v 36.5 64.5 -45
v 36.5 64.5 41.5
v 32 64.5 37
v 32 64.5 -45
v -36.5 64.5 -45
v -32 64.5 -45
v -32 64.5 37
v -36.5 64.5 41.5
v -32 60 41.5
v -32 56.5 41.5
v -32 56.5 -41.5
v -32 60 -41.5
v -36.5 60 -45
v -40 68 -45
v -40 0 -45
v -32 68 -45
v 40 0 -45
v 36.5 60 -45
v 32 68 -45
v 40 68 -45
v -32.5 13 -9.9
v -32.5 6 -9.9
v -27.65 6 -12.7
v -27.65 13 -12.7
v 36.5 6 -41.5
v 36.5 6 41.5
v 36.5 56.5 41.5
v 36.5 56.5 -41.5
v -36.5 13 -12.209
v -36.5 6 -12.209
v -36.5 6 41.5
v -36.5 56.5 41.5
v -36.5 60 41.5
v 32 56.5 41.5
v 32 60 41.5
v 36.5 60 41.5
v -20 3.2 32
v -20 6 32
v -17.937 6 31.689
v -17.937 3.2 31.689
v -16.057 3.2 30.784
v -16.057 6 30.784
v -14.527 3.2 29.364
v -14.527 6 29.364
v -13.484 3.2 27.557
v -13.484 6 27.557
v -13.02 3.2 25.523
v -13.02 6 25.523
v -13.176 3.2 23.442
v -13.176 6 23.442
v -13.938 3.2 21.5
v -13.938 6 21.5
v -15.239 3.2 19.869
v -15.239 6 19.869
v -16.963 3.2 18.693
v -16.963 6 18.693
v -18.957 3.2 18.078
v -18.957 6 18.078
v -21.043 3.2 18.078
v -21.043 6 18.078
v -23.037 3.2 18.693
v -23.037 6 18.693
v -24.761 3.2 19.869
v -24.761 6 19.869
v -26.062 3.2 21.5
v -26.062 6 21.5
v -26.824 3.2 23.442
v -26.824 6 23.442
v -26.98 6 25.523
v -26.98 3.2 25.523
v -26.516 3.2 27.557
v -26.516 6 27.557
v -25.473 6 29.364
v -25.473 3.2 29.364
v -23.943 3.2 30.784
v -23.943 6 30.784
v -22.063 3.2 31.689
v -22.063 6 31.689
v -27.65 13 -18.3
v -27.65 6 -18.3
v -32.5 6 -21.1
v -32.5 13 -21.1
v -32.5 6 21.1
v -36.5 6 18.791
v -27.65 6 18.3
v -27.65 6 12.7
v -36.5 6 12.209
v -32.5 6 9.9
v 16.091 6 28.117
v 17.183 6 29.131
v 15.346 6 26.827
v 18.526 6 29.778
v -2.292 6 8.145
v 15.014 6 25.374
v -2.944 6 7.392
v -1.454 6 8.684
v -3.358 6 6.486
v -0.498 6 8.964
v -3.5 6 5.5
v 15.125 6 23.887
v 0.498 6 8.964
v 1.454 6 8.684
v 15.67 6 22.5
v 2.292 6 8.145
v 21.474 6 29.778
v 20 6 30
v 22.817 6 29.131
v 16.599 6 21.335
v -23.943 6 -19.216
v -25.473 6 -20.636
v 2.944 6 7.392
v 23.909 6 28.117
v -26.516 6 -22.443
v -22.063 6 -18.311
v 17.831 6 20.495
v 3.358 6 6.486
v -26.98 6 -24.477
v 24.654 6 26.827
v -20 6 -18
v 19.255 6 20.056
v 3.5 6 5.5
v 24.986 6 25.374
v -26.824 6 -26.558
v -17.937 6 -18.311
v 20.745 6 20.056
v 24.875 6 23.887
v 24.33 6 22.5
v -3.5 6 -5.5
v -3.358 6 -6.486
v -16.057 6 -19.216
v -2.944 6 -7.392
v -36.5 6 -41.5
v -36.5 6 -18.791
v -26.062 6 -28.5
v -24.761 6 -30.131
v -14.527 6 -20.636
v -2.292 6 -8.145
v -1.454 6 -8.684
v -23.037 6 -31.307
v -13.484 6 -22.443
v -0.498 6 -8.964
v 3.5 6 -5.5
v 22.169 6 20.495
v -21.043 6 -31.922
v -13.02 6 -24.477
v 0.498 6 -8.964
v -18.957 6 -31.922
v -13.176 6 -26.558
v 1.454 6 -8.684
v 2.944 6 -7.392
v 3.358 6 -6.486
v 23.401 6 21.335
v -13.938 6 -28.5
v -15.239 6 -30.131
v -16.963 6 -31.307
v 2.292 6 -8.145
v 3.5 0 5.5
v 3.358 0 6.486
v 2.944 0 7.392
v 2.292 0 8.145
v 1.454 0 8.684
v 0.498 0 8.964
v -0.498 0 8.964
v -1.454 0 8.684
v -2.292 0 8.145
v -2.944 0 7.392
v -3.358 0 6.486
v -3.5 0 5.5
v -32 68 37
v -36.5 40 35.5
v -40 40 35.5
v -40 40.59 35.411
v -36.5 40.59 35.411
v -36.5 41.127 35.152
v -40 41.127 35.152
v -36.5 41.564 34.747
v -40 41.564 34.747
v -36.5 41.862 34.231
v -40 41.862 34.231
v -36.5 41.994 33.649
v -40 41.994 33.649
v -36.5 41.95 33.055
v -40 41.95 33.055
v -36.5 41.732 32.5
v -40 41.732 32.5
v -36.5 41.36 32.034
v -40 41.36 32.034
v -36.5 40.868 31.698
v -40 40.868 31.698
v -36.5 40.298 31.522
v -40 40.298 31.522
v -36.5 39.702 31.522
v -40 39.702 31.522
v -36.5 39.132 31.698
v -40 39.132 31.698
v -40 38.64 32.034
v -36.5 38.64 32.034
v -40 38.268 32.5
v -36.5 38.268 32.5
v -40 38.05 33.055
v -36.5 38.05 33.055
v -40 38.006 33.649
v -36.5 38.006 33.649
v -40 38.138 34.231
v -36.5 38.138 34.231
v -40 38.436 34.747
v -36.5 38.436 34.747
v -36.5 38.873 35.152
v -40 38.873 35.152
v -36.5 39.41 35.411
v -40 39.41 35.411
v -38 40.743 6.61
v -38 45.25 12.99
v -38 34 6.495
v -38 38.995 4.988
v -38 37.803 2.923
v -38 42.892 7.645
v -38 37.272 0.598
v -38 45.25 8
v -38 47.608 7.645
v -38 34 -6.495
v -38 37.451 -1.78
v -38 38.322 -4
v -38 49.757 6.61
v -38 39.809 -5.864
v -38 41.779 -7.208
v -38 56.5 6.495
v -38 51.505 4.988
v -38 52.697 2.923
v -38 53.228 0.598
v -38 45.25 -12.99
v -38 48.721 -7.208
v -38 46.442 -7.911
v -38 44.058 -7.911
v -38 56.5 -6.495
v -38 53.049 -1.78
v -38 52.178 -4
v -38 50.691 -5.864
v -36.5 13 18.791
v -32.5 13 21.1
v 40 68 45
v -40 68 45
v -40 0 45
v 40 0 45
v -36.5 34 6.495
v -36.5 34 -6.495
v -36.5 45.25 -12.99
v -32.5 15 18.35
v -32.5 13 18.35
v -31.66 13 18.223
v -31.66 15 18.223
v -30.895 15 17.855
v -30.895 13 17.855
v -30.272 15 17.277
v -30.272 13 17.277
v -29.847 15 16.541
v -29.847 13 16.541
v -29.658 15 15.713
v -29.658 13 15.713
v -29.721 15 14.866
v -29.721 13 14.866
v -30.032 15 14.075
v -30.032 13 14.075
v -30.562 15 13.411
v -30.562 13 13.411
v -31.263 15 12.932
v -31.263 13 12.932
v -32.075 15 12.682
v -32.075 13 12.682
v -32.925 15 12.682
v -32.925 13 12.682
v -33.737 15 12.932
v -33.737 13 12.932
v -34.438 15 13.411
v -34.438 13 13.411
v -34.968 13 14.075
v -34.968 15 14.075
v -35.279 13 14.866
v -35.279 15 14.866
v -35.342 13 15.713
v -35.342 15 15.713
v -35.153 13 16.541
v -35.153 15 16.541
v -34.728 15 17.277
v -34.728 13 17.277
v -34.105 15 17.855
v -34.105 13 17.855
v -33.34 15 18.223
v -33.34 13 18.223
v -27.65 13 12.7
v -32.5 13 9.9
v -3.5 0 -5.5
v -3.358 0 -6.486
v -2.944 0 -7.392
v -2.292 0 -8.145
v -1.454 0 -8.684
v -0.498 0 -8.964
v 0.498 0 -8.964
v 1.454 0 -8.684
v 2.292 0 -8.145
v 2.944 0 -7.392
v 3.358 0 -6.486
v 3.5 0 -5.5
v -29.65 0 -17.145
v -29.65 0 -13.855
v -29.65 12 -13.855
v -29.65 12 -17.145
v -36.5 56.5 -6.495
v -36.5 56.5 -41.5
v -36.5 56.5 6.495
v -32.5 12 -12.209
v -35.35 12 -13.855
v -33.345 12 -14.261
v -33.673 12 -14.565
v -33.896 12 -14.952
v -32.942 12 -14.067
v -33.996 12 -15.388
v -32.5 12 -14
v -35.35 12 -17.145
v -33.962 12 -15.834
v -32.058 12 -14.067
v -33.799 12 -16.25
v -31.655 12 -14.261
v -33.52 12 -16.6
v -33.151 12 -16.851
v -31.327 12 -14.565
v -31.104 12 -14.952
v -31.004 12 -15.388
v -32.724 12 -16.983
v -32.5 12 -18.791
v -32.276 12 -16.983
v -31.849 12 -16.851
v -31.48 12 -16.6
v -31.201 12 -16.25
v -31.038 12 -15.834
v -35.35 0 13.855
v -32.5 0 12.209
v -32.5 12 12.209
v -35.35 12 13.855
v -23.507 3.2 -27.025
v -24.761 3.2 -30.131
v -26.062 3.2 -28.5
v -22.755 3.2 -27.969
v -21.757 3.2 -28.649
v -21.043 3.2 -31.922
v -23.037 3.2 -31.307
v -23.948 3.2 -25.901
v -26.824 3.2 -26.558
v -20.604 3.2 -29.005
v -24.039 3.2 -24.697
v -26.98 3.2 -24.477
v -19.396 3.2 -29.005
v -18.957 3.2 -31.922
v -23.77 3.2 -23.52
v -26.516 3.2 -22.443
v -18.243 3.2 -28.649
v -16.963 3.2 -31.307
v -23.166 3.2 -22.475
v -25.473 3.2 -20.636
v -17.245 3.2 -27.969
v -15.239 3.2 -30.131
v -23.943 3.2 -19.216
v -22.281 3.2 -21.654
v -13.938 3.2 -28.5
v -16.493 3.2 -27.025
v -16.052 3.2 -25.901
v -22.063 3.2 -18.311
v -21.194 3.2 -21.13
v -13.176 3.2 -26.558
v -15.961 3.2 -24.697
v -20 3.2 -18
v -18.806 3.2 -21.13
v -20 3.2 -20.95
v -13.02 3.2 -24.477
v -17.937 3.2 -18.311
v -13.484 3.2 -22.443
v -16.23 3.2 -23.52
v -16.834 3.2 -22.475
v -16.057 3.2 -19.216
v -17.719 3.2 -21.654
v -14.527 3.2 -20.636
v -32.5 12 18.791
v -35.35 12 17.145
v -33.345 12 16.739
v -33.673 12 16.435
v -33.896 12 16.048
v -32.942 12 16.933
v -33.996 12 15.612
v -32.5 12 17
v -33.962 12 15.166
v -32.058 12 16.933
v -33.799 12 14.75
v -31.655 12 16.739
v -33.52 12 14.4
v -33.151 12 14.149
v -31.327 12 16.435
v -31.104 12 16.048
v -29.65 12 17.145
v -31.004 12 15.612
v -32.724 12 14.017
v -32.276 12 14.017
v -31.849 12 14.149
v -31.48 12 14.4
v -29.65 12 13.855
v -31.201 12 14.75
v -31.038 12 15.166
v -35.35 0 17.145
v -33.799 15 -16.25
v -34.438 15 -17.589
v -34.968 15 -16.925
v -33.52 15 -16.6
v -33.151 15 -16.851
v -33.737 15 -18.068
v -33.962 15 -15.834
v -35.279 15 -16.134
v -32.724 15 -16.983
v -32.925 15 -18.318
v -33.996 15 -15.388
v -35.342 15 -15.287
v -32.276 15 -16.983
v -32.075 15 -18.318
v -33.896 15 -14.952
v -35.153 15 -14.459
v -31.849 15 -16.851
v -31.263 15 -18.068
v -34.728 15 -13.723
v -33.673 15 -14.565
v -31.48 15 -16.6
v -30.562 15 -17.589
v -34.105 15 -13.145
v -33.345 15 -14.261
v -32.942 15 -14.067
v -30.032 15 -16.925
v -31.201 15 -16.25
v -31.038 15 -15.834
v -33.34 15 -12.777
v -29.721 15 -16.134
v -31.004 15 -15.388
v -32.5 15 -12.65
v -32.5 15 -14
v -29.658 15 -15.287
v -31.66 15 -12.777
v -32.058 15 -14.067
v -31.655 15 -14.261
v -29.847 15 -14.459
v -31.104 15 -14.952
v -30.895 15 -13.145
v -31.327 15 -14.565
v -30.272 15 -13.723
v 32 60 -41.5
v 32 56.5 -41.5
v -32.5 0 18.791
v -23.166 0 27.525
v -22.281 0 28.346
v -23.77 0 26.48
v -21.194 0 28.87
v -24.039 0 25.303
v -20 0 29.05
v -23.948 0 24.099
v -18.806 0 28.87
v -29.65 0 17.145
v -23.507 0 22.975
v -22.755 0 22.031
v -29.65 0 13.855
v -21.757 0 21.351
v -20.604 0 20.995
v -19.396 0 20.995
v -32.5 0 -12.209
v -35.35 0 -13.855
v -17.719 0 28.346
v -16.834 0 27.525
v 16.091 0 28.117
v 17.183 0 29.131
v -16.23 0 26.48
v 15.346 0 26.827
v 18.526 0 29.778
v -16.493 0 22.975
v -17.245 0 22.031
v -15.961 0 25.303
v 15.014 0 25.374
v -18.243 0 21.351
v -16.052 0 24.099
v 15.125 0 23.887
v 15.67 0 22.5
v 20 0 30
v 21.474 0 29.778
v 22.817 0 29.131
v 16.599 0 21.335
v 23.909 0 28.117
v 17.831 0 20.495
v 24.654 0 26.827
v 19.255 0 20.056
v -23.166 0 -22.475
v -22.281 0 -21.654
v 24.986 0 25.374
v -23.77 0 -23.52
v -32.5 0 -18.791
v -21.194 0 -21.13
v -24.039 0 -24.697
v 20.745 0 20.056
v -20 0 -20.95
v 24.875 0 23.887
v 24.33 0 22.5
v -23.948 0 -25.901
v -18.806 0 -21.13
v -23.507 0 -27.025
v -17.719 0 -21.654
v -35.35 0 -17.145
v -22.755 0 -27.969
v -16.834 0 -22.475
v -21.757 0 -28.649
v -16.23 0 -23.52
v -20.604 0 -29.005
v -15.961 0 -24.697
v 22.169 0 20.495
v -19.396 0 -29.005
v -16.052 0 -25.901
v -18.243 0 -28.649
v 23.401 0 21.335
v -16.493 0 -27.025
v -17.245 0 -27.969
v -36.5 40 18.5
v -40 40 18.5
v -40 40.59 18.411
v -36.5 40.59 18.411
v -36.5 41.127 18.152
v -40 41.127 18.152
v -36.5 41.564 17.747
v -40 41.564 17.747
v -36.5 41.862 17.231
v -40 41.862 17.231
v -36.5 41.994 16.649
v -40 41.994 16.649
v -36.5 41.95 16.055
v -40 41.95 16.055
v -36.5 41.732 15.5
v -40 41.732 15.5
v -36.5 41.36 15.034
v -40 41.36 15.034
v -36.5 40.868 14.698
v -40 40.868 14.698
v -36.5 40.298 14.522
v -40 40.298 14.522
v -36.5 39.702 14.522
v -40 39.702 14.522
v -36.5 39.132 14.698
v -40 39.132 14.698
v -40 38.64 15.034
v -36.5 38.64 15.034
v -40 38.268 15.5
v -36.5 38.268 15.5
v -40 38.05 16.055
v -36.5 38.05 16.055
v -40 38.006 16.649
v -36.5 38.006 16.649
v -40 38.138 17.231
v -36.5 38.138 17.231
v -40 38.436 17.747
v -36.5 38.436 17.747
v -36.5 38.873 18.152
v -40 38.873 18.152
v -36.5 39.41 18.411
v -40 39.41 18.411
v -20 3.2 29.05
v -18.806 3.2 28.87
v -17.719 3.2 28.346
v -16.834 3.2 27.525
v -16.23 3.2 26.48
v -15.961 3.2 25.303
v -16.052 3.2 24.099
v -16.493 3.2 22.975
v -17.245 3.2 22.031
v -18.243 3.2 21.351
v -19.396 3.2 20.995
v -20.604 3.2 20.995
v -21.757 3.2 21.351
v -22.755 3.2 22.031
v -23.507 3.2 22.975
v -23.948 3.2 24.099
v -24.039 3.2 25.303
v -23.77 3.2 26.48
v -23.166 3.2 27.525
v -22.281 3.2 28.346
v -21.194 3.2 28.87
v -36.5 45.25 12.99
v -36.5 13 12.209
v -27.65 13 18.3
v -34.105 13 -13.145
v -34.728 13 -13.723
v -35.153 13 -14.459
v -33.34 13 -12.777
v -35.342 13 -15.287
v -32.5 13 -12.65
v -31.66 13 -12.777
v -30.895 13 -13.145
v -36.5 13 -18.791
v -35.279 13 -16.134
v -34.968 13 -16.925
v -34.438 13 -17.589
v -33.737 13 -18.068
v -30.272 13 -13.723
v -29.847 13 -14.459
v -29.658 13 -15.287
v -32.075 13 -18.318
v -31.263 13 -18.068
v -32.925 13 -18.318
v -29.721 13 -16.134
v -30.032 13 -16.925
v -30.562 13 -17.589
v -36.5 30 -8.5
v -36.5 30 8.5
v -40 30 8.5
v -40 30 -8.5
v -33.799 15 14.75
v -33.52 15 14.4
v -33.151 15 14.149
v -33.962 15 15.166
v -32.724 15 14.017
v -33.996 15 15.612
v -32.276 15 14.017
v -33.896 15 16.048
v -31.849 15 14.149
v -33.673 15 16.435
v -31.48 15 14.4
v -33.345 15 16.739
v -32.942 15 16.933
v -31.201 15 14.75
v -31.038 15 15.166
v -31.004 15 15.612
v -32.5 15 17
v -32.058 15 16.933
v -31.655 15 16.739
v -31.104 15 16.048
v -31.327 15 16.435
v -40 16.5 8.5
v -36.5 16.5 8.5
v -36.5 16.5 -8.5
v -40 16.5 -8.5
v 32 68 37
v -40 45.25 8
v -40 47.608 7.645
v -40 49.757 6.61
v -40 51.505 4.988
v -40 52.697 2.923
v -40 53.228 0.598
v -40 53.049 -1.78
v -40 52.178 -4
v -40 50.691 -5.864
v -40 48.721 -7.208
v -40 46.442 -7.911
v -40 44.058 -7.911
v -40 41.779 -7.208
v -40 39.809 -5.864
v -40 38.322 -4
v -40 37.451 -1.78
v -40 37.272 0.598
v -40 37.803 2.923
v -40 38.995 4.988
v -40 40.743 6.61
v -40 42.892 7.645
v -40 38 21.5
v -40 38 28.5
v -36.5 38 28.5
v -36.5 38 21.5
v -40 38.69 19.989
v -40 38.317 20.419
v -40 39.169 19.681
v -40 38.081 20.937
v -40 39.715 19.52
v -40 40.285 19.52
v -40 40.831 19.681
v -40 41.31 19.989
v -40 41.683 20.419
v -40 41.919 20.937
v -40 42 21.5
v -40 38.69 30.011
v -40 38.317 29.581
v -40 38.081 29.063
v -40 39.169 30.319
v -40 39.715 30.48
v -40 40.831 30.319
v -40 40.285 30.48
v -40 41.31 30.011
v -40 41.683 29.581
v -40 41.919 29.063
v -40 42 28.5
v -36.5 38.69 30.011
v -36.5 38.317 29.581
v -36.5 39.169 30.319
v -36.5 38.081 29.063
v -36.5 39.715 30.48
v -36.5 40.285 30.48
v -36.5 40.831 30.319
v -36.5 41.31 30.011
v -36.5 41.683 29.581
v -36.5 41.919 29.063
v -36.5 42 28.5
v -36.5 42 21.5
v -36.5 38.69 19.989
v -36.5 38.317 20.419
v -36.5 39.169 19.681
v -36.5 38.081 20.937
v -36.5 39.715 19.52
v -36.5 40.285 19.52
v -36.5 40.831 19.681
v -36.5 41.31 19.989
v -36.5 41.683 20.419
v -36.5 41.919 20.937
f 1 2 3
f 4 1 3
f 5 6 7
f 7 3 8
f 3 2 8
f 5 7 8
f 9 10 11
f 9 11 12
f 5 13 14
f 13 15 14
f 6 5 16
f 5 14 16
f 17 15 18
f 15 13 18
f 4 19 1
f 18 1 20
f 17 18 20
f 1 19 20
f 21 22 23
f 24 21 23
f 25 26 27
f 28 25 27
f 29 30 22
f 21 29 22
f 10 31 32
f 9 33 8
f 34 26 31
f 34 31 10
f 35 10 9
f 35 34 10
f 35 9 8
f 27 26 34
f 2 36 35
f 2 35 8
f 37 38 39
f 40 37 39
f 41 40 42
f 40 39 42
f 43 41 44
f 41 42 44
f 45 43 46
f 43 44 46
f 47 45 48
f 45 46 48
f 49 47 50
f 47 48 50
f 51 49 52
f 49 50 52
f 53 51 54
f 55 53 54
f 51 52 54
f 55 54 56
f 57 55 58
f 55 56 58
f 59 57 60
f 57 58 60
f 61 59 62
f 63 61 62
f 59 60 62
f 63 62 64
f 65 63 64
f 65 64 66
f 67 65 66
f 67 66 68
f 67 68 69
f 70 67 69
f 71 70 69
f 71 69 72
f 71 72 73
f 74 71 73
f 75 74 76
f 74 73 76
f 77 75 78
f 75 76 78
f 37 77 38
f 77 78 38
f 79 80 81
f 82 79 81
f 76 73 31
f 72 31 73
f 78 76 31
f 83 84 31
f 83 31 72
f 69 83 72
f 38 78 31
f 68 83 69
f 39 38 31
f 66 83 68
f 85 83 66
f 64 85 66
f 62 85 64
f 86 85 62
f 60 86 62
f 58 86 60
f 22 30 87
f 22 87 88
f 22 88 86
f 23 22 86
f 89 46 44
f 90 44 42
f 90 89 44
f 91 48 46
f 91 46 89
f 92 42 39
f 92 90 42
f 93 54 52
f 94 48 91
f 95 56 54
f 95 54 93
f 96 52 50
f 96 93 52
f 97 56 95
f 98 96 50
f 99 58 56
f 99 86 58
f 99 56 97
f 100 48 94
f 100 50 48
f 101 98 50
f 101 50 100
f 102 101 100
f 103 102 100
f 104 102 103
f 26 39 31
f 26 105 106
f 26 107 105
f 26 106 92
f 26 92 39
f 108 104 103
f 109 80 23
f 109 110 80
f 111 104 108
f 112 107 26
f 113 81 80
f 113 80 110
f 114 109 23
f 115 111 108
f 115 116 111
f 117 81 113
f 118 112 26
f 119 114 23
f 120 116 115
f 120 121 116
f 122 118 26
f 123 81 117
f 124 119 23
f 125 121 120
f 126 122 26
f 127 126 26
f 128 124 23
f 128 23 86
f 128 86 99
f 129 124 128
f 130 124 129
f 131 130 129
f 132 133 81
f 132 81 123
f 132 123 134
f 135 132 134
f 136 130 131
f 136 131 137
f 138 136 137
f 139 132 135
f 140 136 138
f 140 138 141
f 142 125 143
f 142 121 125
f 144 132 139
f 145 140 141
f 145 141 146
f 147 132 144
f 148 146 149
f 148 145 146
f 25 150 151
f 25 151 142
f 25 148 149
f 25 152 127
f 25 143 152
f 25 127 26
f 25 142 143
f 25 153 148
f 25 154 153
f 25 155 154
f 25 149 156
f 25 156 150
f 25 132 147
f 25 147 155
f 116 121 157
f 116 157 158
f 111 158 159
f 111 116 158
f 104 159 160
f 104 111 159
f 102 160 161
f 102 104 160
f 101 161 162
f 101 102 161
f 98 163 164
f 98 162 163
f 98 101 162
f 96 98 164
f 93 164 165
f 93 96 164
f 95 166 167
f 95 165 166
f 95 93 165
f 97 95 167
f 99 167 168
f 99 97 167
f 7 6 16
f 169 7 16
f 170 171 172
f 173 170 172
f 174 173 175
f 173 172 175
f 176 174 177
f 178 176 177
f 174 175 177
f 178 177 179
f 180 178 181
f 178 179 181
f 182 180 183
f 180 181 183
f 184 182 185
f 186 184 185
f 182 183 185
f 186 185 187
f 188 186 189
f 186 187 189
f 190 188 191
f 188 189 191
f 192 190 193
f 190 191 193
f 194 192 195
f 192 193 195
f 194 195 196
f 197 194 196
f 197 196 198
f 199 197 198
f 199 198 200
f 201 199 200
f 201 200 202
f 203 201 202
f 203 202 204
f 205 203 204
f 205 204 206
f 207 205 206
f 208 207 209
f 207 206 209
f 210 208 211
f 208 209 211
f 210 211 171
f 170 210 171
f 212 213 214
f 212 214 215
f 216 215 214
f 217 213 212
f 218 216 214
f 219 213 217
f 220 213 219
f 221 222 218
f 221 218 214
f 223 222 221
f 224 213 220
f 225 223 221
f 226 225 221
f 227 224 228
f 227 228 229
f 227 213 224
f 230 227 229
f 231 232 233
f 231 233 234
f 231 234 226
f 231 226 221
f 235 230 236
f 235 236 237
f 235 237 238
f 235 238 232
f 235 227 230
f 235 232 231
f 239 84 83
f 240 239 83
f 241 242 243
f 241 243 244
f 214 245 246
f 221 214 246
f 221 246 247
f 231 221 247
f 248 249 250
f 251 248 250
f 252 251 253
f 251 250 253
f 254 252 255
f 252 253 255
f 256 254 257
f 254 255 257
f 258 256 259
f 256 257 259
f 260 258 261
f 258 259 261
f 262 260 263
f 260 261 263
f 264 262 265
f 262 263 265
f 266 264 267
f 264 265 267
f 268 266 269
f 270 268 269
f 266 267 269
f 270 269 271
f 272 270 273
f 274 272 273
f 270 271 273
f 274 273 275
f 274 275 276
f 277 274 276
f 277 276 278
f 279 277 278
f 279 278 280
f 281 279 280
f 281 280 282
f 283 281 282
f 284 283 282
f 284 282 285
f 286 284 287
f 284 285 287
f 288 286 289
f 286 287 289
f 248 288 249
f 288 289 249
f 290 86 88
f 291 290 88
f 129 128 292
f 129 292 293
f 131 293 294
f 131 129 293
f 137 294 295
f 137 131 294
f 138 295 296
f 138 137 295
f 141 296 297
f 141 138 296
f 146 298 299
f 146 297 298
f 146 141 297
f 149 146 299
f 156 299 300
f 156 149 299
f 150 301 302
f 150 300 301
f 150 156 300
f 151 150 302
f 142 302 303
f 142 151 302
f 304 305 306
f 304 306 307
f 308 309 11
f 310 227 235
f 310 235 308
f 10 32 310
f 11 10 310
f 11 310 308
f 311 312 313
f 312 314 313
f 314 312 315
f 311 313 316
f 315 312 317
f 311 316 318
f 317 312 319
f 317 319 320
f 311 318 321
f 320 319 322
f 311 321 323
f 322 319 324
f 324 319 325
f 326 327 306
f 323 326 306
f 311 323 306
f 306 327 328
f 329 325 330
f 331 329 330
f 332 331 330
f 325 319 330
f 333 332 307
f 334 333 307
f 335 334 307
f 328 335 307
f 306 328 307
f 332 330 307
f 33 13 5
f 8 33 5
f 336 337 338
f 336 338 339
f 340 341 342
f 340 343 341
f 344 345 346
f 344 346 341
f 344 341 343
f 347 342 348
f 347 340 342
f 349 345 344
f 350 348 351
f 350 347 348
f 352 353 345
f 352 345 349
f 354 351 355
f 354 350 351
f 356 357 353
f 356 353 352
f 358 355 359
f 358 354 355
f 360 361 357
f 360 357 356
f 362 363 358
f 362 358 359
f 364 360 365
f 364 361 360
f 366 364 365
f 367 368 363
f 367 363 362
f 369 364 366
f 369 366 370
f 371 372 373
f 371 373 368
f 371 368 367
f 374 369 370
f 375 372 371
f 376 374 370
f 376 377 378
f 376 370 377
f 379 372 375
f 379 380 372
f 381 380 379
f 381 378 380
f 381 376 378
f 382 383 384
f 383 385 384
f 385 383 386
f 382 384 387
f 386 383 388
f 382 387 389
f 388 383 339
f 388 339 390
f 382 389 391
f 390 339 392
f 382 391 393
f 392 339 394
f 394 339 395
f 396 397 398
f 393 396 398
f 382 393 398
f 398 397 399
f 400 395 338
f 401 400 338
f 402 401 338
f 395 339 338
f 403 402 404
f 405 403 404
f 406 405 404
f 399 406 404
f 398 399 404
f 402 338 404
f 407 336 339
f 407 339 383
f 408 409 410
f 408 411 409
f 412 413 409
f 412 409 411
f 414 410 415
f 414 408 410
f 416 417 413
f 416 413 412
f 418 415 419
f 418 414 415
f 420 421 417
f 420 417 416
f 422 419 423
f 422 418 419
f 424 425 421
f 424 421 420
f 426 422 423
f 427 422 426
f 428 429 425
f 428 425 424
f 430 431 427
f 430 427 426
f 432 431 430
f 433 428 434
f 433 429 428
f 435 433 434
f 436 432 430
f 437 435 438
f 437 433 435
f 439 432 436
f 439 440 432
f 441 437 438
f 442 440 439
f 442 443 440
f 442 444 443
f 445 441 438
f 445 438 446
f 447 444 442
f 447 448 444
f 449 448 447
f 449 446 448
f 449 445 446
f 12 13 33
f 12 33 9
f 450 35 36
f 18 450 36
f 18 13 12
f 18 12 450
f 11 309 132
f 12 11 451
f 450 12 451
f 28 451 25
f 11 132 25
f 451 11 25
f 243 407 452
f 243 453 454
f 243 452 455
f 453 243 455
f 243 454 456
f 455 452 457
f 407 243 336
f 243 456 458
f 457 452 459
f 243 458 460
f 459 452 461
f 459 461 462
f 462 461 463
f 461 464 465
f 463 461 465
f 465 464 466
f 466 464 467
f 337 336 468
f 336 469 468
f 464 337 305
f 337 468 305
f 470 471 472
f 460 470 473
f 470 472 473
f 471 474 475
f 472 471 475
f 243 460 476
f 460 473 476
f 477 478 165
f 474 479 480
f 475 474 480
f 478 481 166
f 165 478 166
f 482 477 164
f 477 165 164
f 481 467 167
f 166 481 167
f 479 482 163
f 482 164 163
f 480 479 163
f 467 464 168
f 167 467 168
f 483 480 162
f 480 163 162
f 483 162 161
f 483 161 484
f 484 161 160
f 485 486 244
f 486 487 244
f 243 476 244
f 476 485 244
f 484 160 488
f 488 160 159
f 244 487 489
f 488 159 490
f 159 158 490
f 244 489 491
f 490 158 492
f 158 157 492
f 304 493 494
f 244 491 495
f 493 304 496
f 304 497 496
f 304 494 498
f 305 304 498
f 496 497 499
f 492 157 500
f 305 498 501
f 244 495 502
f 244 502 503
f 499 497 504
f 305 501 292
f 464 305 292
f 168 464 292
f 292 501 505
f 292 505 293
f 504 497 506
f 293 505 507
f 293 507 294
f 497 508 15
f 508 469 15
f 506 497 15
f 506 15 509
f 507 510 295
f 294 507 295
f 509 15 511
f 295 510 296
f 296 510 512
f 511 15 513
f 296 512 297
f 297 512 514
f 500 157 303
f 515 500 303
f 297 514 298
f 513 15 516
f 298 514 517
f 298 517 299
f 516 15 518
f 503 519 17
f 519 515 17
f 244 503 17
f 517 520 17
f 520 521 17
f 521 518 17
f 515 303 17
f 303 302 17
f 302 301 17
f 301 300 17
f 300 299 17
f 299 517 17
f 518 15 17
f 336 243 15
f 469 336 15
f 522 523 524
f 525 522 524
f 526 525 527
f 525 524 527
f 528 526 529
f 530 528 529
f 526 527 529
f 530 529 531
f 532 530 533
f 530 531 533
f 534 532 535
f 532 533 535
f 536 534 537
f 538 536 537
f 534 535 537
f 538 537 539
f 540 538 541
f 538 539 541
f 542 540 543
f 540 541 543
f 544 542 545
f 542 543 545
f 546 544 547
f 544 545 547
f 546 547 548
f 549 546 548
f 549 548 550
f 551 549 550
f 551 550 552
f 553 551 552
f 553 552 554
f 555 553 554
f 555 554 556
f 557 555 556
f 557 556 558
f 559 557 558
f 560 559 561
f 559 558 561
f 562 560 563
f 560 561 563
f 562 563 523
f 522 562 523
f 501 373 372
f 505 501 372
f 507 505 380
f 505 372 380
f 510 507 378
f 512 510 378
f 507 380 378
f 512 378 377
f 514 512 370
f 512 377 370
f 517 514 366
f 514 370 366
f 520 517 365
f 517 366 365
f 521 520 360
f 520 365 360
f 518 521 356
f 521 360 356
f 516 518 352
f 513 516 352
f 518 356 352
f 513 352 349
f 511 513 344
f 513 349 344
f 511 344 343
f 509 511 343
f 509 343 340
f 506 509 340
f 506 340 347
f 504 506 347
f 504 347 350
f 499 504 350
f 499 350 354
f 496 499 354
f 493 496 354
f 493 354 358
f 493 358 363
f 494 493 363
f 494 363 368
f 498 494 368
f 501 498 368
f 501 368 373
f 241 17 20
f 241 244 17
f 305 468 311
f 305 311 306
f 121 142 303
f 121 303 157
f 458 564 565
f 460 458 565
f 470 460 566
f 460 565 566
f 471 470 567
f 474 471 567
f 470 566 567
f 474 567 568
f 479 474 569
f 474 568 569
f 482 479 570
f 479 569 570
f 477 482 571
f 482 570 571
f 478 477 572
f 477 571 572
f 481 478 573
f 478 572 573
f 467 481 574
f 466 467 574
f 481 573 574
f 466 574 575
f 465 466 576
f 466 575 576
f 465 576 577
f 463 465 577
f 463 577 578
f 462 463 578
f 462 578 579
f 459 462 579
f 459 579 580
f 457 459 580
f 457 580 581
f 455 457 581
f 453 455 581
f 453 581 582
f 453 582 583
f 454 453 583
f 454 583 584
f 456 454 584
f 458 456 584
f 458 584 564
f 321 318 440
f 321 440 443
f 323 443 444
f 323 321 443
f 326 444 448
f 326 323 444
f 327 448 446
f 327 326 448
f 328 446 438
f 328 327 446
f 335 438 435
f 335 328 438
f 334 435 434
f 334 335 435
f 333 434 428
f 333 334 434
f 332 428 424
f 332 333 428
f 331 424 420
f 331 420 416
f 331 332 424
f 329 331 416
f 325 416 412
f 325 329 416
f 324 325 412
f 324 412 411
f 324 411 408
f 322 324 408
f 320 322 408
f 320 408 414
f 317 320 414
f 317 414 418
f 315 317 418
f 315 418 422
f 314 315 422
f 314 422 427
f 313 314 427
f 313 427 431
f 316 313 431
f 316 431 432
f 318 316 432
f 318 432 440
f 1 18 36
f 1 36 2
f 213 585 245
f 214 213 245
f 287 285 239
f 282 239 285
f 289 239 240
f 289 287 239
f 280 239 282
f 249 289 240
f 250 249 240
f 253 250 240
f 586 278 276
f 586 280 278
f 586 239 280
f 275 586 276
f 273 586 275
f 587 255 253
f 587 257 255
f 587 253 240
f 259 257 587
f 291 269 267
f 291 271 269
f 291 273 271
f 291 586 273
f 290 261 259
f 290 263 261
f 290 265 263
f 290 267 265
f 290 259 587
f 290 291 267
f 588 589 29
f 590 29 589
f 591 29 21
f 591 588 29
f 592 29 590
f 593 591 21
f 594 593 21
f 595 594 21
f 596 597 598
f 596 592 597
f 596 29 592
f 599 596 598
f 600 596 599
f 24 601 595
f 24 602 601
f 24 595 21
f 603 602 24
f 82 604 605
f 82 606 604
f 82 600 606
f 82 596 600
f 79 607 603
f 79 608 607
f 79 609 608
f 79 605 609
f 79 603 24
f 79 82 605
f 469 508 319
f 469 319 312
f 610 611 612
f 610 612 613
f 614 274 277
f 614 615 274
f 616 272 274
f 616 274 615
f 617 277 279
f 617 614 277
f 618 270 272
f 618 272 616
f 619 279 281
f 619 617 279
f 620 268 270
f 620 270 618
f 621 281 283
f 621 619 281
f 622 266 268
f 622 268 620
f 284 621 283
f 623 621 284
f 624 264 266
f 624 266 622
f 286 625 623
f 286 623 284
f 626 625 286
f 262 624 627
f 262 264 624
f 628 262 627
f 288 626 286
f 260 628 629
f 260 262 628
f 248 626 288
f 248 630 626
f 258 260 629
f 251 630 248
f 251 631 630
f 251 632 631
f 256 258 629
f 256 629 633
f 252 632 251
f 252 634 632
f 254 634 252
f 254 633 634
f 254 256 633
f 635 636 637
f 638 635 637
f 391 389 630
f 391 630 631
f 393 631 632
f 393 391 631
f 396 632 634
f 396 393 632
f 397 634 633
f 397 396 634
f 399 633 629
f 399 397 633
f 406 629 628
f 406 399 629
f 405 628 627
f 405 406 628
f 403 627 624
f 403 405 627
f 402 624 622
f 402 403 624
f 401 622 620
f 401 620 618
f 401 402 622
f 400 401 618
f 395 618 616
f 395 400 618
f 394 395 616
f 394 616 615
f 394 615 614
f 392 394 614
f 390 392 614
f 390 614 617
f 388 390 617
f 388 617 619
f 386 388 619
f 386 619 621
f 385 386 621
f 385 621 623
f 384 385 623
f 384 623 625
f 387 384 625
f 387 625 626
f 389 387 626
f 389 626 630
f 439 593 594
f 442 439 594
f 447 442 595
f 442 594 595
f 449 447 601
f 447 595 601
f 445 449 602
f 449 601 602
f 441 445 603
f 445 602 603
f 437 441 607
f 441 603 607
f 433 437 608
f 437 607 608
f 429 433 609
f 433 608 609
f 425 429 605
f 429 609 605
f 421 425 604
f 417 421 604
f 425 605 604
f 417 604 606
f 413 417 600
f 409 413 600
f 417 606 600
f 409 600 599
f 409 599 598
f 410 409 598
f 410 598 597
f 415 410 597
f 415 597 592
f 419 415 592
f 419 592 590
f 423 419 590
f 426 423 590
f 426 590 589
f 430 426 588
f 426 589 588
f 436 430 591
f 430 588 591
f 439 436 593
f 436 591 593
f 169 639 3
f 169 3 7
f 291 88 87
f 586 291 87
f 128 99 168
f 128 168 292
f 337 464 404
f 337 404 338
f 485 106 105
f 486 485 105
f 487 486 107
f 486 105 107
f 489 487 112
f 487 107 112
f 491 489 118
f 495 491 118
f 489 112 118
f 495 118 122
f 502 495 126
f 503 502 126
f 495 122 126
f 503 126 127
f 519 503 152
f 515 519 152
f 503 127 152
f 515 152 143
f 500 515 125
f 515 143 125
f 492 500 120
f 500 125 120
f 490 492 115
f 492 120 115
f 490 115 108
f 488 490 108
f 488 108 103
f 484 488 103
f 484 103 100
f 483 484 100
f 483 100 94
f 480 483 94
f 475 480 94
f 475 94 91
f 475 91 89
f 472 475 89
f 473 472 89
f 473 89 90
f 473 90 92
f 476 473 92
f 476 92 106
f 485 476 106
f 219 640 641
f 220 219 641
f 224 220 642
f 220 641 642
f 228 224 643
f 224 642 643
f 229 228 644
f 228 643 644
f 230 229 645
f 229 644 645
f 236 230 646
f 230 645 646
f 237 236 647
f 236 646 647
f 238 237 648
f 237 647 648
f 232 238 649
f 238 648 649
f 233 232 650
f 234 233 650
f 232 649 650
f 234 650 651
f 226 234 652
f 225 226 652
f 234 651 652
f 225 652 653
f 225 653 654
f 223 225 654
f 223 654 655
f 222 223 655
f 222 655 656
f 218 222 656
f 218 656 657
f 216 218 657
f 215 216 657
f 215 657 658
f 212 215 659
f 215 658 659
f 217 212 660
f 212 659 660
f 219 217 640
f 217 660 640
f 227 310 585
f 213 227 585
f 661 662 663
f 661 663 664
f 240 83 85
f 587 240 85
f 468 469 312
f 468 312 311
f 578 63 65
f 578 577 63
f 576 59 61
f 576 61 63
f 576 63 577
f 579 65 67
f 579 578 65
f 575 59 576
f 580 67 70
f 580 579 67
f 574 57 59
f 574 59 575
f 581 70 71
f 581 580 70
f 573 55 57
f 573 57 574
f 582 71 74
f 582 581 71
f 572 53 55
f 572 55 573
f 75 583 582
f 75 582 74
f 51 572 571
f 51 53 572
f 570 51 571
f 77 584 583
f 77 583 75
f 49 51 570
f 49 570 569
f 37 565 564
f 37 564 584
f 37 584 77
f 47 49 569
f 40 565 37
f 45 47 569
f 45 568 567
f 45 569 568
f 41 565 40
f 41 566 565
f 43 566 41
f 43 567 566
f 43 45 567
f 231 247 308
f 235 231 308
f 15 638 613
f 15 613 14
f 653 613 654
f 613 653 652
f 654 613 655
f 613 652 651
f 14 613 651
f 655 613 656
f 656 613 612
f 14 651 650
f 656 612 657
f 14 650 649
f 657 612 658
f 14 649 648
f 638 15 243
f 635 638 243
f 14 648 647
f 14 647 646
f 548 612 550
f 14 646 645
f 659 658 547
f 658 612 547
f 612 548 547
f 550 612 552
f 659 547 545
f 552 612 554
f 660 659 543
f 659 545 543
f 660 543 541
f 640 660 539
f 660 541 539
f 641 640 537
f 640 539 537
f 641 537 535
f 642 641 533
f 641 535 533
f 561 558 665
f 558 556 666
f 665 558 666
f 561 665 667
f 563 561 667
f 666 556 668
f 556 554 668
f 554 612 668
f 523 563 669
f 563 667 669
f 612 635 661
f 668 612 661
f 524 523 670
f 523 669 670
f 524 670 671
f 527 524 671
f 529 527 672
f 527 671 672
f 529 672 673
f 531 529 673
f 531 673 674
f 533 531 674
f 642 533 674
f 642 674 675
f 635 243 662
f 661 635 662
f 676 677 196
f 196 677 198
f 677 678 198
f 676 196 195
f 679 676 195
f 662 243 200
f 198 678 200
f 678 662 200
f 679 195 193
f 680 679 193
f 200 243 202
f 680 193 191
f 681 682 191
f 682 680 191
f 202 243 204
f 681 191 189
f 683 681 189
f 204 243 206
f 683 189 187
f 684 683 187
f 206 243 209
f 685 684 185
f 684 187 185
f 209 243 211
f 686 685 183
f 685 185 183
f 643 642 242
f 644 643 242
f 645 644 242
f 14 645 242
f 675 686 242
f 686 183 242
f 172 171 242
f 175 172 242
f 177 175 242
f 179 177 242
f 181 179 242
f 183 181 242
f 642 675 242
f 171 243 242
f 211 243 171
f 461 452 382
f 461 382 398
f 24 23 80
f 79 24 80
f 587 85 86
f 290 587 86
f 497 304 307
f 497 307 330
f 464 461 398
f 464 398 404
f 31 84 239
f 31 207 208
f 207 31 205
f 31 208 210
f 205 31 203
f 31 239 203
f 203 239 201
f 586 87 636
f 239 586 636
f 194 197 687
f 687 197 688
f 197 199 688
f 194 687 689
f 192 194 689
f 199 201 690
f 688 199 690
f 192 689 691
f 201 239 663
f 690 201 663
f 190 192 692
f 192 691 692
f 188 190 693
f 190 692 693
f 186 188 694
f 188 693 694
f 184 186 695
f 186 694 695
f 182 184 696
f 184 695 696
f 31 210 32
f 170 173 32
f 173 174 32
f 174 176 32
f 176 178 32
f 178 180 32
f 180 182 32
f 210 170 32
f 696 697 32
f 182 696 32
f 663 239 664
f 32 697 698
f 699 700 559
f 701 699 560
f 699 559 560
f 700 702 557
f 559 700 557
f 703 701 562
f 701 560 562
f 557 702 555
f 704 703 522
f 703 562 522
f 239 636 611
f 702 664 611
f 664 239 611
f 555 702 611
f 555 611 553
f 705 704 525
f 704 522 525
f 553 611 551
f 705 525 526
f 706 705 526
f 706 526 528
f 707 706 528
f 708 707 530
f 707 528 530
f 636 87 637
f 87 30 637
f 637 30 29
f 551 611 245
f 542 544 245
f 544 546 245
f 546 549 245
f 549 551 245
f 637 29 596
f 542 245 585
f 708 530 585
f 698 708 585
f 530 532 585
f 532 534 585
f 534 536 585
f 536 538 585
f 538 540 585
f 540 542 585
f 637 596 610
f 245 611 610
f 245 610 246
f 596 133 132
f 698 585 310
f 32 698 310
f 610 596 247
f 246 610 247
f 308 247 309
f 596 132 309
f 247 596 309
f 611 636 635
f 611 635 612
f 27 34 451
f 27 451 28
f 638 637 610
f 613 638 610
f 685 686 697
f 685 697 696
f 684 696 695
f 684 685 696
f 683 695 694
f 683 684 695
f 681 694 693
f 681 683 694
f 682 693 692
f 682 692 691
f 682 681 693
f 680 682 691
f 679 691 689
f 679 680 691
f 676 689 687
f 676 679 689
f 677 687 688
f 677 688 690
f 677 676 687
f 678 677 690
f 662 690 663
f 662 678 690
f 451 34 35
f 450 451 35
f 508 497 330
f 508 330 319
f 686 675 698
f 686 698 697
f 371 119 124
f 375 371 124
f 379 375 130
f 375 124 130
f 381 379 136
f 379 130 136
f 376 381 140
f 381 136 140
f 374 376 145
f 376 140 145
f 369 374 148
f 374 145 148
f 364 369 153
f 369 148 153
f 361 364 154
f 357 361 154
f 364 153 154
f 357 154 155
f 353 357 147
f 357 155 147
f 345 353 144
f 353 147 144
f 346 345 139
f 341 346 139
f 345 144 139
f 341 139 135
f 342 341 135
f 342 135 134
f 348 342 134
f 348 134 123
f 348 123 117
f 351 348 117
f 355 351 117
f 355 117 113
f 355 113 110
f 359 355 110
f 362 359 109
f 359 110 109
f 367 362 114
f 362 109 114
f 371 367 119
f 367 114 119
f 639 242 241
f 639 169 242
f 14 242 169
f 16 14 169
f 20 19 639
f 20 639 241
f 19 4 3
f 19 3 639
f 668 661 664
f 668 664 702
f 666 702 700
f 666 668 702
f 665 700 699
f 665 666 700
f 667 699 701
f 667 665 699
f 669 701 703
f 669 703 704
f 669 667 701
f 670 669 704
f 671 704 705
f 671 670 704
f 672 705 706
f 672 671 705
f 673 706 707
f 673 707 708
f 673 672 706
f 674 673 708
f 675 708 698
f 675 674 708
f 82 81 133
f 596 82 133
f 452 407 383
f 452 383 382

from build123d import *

# Parameters (mm, degrees)
SKETCH1_W               = 80
SKETCH1_H               = 90
BOSS_EXTRUDE1_DEPTH     = 6
SKETCH4_W               = 80
SKETCH4_H               = 90
SKETCH4_W_2             = 73
SKETCH4_H_2             = 83
BOSS_EXTRUDE2_DEPTH     = 54
SKETCH6_R               = 4.05
SKETCH6_R_2             = 5
CUT_EXTRUDE1_DEPTH      = 40
SKETCH7_R               = 7
CUT_EXTRUDE2_DEPTH      = 2.8
BOSS_EXTRUDE3_DEPTH     = 7
SKETCH11_R              = 2.85
BOSS_EXTRUDE4_DEPTH     = 2
CUT_EXTRUDE3_DEPTH      = 9
CUT_EXTRUDE3_DEPTH_BACK = 6
SKETCH5_R               = 1.5
CUT_EXTRUDE4_DEPTH      = 6
CUT_EXTRUDE4_DEPTH_BACK = 81.876448982
SKETCH12_W              = 17
SKETCH12_H              = 13.5
CUT_EXTRUDE6_DEPTH      = 3.5
SKETCH17_R              = 8
CUT_EXTRUDE8_DEPTH      = 2
CUT_EXTRUDE9_DEPTH      = 1.5
CUT_EXTRUDE10_DEPTH     = 10
BOSS_EXTRUDE5_DEPTH     = 90
BOSS_EXTRUDE5_2_DEPTH   = 90
SKETCH21_W              = 3.5
SKETCH21_H              = 8
BOSS_EXTRUDE6_DEPTH     = 80
SKETCH22_W              = 80
SKETCH22_H              = 3.5
BOSS_EXTRUDE7_DEPTH     = 4.5
SKETCH24_W              = 8
SKETCH24_H              = 3.5
BOSS_EXTRUDE8_DEPTH     = 90
SKETCH26_R              = 2
CUT_EXTRUDE11_DEPTH     = 3.5


with BuildPart() as part:
    # Sketch1 → Boss-Extrude1 (new body)
    with BuildSketch(Plane(origin=(0, 0, 0), x_dir=(1, 0, 0), z_dir=(0, 1, 0))):
        Rectangle(SKETCH1_W, SKETCH1_H)
    extrude(amount=BOSS_EXTRUDE1_DEPTH)

    # Sketch4 → Boss-Extrude2 (add)
    with BuildSketch(Plane(origin=(0, 6, 0), x_dir=(1, 0, 0), z_dir=(0, 1, 0))):
        Rectangle(SKETCH4_W, SKETCH4_H)
        Rectangle(SKETCH4_W_2, SKETCH4_H_2, mode=Mode.SUBTRACT)
    extrude(amount=BOSS_EXTRUDE2_DEPTH)

    # Sketch6 → Cut-Extrude1 (cut)
    with BuildSketch(Plane(origin=(0, 6, 0), x_dir=(1, 0, 0), z_dir=(0, 1, 0))):
        with Locations(Location((-20, 25, 0), (0, 0, 270))):
            Circle(SKETCH6_R)
        with Locations(Location((-20, -25, 0), (0, 0, 270))):
            Circle(SKETCH6_R)
        with Locations(Location((20, -25, 0), (0, 0, 270))):
            Circle(SKETCH6_R_2)
    extrude(amount=-CUT_EXTRUDE1_DEPTH, mode=Mode.SUBTRACT)

    # Sketch7 → Cut-Extrude2 (cut)
    with BuildSketch(Plane(origin=(0, 6, 0), x_dir=(1, 0, 0), z_dir=(0, 1, 0))):
        with Locations(Location((-20, 25, 0), (0, 0, 270))):
            Circle(SKETCH7_R)
        with Locations(Location((-20, -25, 0), (0, 0, 270))):
            Circle(SKETCH7_R)
    extrude(amount=-CUT_EXTRUDE2_DEPTH, mode=Mode.SUBTRACT)

    # Sketch10 → Boss-Extrude3 (add)
    with BuildSketch(Plane(origin=(0, 6, 0), x_dir=(1, 0, 0), z_dir=(0, 1, 0))):
        Polygon((-32.5, 21.100297611), (-37.35, 18.300148806), (-37.35, 12.699851194), (-32.5, 9.899702389), (-27.65, 12.699851194), (-27.65, 18.300148806), align=None)
        Polygon((-27.65, -12.699851194), (-32.5, -9.899702389), (-37.35, -12.699851194), (-37.35, -18.300148806), (-32.5, -21.100297611), (-27.65, -18.300148806), align=None)
    extrude(amount=BOSS_EXTRUDE3_DEPTH)

    # Sketch11 → Boss-Extrude4 (add)
    with BuildSketch(Plane(origin=(0, 13, 0), x_dir=(1, 0, 0), z_dir=(0, 1, 0))):
        with Locations(Location((-32.5, 15.5, 0), (0, 0, 270))):
            Circle(SKETCH11_R)
        with Locations(Location((-32.5, -15.5, 0), (0, 0, 270))):
            Circle(SKETCH11_R)
    extrude(amount=BOSS_EXTRUDE4_DEPTH)

    # Sketch5 → Cut-Extrude3 (cut, two sides: drawn at the far end of the back side and taken through both)
    with BuildSketch(Plane(origin=(0, 6, 0), x_dir=(1, 0, 0), z_dir=(0, 1, 0)).offset(-CUT_EXTRUDE3_DEPTH_BACK)):
        with Locations(Location((-32.5, 15.5, 0), (0, 0, 270))):
            Circle(SKETCH5_R)
        with Locations(Location((-32.5, -15.5, 0), (0, 0, 270))):
            Circle(SKETCH5_R)
    extrude(amount=CUT_EXTRUDE3_DEPTH + CUT_EXTRUDE3_DEPTH_BACK, mode=Mode.SUBTRACT)

    # Sketch8 → Cut-Extrude4 (cut, two sides: drawn at the far end of the back side and taken through both)
    with BuildSketch(Plane(origin=(0, 6, 0), x_dir=(1, 0, 0), z_dir=(0, 1, 0)).offset(-CUT_EXTRUDE4_DEPTH_BACK)):
        Polygon((-29.65, 17.145448267), (-32.5, 18.790896534), (-35.35, 17.145448267), (-35.35, 13.854551733), (-32.5, 12.209103466), (-29.65, 13.854551733), align=None)
        Polygon((-29.65, -13.854551733), (-32.5, -12.209103466), (-35.35, -13.854551733), (-35.35, -17.145448267), (-32.5, -18.790896534), (-29.65, -17.145448267), align=None)
    extrude(amount=CUT_EXTRUDE4_DEPTH + CUT_EXTRUDE4_DEPTH_BACK, mode=Mode.SUBTRACT)

    # Sketch12 → Cut-Extrude6 (cut)
    with BuildSketch(Plane(origin=(-36.5, 0, 0), x_dir=(0, 0, -1), z_dir=(1, 0, 0))):
        with Locations((0, 23.25)):
            Rectangle(SKETCH12_W, SKETCH12_H)
    extrude(amount=-CUT_EXTRUDE6_DEPTH, mode=Mode.SUBTRACT)

    # Sketch17 → Cut-Extrude8 (cut)
    with BuildSketch(Plane.ZY.offset(40)):
        with Locations((0, 45.25)):
            Circle(SKETCH17_R)
    extrude(amount=-CUT_EXTRUDE8_DEPTH, mode=Mode.SUBTRACT)

    # Sketch15 → Cut-Extrude9 (cut)
    with BuildSketch(Plane(origin=(-36.5, 0, 0), x_dir=(0, 0, -1), z_dir=(1, 0, 0))):
        Polygon((-6.495190528, 56.5), (-12.990381057, 45.25), (-6.495190528, 34), (6.495190528, 34), (12.990381057, 45.25), (6.495190528, 56.5), align=None)
    extrude(amount=-CUT_EXTRUDE9_DEPTH, mode=Mode.SUBTRACT)

    # Sketch19 → Cut-Extrude10 (cut)
    with BuildSketch(Plane(origin=(0, 6, 0), x_dir=(1, 0, 0), z_dir=(0, 1, 0))):
        with BuildLine():
            Line((-3.5, -5.5), (-3.5, 5.5))
            ThreePointArc((-3.5, 5.5), (0, 9), (3.5, 5.5))
            Line((3.5, 5.5), (3.5, -5.5))
            ThreePointArc((3.5, -5.5), (0, -9), (-3.5, -5.5))
        make_face()
    extrude(amount=-CUT_EXTRUDE10_DEPTH, mode=Mode.SUBTRACT)



with BuildPart() as body_2:
    # Sketch20 → Boss-Extrude5 (new body)
    with BuildSketch(Plane(origin=(0, 0, -45), x_dir=(-1, 0, 0), z_dir=(0, 0, -1))):
        Polygon((-40, 60), (-36.5, 60), (-36.5, 64.5), (-32, 64.5), (-32, 68), (-40, 68), align=None)
    extrude(amount=-BOSS_EXTRUDE5_DEPTH)


with BuildPart() as body_3:
    # Sketch20 → Boss-Extrude5 2 (new body)
    with BuildSketch(Plane(origin=(0, 0, -45), x_dir=(-1, 0, 0), z_dir=(0, 0, -1))):
        Polygon((40, 60), (36.5, 60), (36.5, 64.5), (32, 64.5), (32, 68), (40, 68), align=None)
    extrude(amount=-BOSS_EXTRUDE5_2_DEPTH)


with BuildPart() as part_1:
    add(part.part)

    add(body_2.part)  # Boss-Extrude6 merges body 2
    # Sketch21 → Boss-Extrude6 (add)
    with BuildSketch(Plane(origin=(40, 0, 0), x_dir=(0, 0, -1), z_dir=(1, 0, 0))):
        with Locations((-43.25, 64)):
            Rectangle(SKETCH21_W, SKETCH21_H)
    extrude(amount=-BOSS_EXTRUDE6_DEPTH)


    add(body_3.part)  # Boss-Extrude7 merges body 3
    # Sketch22 → Boss-Extrude7 (add)
    with BuildSketch(Plane(origin=(0, 0, 41.5), x_dir=(-1, 0, 0), z_dir=(0, 0, -1))):
        with Locations((0, 66.25)):
            Rectangle(SKETCH22_W, SKETCH22_H)
    extrude(amount=BOSS_EXTRUDE7_DEPTH)

    # Sketch24 → Boss-Extrude8 (add)
    with BuildSketch(Plane.XY.offset(45)):
        with Locations((-36, 58.25)):
            Rectangle(SKETCH24_W, SKETCH24_H)
        with Locations((36, 58.25)):
            Rectangle(SKETCH24_W, SKETCH24_H)
    extrude(amount=-BOSS_EXTRUDE8_DEPTH)

    # Sketch26 → Cut-Extrude11 (cut)
    with BuildSketch(Plane.ZY.offset(40)):
        with Locations((16.5, 40)):
            Circle(SKETCH26_R)
        with Locations((33.5, 40)):
            Circle(SKETCH26_R)
        with BuildLine():
            Line((21.5, 42), (28.5, 42))
            ThreePointArc((28.5, 42), (30.5, 40), (28.5, 38))
            Line((28.5, 38), (21.5, 38))
            ThreePointArc((21.5, 38), (19.5, 40), (21.5, 42))
        make_face()
    extrude(amount=-CUT_EXTRUDE11_DEPTH, mode=Mode.SUBTRACT)


solid = part_1.part
